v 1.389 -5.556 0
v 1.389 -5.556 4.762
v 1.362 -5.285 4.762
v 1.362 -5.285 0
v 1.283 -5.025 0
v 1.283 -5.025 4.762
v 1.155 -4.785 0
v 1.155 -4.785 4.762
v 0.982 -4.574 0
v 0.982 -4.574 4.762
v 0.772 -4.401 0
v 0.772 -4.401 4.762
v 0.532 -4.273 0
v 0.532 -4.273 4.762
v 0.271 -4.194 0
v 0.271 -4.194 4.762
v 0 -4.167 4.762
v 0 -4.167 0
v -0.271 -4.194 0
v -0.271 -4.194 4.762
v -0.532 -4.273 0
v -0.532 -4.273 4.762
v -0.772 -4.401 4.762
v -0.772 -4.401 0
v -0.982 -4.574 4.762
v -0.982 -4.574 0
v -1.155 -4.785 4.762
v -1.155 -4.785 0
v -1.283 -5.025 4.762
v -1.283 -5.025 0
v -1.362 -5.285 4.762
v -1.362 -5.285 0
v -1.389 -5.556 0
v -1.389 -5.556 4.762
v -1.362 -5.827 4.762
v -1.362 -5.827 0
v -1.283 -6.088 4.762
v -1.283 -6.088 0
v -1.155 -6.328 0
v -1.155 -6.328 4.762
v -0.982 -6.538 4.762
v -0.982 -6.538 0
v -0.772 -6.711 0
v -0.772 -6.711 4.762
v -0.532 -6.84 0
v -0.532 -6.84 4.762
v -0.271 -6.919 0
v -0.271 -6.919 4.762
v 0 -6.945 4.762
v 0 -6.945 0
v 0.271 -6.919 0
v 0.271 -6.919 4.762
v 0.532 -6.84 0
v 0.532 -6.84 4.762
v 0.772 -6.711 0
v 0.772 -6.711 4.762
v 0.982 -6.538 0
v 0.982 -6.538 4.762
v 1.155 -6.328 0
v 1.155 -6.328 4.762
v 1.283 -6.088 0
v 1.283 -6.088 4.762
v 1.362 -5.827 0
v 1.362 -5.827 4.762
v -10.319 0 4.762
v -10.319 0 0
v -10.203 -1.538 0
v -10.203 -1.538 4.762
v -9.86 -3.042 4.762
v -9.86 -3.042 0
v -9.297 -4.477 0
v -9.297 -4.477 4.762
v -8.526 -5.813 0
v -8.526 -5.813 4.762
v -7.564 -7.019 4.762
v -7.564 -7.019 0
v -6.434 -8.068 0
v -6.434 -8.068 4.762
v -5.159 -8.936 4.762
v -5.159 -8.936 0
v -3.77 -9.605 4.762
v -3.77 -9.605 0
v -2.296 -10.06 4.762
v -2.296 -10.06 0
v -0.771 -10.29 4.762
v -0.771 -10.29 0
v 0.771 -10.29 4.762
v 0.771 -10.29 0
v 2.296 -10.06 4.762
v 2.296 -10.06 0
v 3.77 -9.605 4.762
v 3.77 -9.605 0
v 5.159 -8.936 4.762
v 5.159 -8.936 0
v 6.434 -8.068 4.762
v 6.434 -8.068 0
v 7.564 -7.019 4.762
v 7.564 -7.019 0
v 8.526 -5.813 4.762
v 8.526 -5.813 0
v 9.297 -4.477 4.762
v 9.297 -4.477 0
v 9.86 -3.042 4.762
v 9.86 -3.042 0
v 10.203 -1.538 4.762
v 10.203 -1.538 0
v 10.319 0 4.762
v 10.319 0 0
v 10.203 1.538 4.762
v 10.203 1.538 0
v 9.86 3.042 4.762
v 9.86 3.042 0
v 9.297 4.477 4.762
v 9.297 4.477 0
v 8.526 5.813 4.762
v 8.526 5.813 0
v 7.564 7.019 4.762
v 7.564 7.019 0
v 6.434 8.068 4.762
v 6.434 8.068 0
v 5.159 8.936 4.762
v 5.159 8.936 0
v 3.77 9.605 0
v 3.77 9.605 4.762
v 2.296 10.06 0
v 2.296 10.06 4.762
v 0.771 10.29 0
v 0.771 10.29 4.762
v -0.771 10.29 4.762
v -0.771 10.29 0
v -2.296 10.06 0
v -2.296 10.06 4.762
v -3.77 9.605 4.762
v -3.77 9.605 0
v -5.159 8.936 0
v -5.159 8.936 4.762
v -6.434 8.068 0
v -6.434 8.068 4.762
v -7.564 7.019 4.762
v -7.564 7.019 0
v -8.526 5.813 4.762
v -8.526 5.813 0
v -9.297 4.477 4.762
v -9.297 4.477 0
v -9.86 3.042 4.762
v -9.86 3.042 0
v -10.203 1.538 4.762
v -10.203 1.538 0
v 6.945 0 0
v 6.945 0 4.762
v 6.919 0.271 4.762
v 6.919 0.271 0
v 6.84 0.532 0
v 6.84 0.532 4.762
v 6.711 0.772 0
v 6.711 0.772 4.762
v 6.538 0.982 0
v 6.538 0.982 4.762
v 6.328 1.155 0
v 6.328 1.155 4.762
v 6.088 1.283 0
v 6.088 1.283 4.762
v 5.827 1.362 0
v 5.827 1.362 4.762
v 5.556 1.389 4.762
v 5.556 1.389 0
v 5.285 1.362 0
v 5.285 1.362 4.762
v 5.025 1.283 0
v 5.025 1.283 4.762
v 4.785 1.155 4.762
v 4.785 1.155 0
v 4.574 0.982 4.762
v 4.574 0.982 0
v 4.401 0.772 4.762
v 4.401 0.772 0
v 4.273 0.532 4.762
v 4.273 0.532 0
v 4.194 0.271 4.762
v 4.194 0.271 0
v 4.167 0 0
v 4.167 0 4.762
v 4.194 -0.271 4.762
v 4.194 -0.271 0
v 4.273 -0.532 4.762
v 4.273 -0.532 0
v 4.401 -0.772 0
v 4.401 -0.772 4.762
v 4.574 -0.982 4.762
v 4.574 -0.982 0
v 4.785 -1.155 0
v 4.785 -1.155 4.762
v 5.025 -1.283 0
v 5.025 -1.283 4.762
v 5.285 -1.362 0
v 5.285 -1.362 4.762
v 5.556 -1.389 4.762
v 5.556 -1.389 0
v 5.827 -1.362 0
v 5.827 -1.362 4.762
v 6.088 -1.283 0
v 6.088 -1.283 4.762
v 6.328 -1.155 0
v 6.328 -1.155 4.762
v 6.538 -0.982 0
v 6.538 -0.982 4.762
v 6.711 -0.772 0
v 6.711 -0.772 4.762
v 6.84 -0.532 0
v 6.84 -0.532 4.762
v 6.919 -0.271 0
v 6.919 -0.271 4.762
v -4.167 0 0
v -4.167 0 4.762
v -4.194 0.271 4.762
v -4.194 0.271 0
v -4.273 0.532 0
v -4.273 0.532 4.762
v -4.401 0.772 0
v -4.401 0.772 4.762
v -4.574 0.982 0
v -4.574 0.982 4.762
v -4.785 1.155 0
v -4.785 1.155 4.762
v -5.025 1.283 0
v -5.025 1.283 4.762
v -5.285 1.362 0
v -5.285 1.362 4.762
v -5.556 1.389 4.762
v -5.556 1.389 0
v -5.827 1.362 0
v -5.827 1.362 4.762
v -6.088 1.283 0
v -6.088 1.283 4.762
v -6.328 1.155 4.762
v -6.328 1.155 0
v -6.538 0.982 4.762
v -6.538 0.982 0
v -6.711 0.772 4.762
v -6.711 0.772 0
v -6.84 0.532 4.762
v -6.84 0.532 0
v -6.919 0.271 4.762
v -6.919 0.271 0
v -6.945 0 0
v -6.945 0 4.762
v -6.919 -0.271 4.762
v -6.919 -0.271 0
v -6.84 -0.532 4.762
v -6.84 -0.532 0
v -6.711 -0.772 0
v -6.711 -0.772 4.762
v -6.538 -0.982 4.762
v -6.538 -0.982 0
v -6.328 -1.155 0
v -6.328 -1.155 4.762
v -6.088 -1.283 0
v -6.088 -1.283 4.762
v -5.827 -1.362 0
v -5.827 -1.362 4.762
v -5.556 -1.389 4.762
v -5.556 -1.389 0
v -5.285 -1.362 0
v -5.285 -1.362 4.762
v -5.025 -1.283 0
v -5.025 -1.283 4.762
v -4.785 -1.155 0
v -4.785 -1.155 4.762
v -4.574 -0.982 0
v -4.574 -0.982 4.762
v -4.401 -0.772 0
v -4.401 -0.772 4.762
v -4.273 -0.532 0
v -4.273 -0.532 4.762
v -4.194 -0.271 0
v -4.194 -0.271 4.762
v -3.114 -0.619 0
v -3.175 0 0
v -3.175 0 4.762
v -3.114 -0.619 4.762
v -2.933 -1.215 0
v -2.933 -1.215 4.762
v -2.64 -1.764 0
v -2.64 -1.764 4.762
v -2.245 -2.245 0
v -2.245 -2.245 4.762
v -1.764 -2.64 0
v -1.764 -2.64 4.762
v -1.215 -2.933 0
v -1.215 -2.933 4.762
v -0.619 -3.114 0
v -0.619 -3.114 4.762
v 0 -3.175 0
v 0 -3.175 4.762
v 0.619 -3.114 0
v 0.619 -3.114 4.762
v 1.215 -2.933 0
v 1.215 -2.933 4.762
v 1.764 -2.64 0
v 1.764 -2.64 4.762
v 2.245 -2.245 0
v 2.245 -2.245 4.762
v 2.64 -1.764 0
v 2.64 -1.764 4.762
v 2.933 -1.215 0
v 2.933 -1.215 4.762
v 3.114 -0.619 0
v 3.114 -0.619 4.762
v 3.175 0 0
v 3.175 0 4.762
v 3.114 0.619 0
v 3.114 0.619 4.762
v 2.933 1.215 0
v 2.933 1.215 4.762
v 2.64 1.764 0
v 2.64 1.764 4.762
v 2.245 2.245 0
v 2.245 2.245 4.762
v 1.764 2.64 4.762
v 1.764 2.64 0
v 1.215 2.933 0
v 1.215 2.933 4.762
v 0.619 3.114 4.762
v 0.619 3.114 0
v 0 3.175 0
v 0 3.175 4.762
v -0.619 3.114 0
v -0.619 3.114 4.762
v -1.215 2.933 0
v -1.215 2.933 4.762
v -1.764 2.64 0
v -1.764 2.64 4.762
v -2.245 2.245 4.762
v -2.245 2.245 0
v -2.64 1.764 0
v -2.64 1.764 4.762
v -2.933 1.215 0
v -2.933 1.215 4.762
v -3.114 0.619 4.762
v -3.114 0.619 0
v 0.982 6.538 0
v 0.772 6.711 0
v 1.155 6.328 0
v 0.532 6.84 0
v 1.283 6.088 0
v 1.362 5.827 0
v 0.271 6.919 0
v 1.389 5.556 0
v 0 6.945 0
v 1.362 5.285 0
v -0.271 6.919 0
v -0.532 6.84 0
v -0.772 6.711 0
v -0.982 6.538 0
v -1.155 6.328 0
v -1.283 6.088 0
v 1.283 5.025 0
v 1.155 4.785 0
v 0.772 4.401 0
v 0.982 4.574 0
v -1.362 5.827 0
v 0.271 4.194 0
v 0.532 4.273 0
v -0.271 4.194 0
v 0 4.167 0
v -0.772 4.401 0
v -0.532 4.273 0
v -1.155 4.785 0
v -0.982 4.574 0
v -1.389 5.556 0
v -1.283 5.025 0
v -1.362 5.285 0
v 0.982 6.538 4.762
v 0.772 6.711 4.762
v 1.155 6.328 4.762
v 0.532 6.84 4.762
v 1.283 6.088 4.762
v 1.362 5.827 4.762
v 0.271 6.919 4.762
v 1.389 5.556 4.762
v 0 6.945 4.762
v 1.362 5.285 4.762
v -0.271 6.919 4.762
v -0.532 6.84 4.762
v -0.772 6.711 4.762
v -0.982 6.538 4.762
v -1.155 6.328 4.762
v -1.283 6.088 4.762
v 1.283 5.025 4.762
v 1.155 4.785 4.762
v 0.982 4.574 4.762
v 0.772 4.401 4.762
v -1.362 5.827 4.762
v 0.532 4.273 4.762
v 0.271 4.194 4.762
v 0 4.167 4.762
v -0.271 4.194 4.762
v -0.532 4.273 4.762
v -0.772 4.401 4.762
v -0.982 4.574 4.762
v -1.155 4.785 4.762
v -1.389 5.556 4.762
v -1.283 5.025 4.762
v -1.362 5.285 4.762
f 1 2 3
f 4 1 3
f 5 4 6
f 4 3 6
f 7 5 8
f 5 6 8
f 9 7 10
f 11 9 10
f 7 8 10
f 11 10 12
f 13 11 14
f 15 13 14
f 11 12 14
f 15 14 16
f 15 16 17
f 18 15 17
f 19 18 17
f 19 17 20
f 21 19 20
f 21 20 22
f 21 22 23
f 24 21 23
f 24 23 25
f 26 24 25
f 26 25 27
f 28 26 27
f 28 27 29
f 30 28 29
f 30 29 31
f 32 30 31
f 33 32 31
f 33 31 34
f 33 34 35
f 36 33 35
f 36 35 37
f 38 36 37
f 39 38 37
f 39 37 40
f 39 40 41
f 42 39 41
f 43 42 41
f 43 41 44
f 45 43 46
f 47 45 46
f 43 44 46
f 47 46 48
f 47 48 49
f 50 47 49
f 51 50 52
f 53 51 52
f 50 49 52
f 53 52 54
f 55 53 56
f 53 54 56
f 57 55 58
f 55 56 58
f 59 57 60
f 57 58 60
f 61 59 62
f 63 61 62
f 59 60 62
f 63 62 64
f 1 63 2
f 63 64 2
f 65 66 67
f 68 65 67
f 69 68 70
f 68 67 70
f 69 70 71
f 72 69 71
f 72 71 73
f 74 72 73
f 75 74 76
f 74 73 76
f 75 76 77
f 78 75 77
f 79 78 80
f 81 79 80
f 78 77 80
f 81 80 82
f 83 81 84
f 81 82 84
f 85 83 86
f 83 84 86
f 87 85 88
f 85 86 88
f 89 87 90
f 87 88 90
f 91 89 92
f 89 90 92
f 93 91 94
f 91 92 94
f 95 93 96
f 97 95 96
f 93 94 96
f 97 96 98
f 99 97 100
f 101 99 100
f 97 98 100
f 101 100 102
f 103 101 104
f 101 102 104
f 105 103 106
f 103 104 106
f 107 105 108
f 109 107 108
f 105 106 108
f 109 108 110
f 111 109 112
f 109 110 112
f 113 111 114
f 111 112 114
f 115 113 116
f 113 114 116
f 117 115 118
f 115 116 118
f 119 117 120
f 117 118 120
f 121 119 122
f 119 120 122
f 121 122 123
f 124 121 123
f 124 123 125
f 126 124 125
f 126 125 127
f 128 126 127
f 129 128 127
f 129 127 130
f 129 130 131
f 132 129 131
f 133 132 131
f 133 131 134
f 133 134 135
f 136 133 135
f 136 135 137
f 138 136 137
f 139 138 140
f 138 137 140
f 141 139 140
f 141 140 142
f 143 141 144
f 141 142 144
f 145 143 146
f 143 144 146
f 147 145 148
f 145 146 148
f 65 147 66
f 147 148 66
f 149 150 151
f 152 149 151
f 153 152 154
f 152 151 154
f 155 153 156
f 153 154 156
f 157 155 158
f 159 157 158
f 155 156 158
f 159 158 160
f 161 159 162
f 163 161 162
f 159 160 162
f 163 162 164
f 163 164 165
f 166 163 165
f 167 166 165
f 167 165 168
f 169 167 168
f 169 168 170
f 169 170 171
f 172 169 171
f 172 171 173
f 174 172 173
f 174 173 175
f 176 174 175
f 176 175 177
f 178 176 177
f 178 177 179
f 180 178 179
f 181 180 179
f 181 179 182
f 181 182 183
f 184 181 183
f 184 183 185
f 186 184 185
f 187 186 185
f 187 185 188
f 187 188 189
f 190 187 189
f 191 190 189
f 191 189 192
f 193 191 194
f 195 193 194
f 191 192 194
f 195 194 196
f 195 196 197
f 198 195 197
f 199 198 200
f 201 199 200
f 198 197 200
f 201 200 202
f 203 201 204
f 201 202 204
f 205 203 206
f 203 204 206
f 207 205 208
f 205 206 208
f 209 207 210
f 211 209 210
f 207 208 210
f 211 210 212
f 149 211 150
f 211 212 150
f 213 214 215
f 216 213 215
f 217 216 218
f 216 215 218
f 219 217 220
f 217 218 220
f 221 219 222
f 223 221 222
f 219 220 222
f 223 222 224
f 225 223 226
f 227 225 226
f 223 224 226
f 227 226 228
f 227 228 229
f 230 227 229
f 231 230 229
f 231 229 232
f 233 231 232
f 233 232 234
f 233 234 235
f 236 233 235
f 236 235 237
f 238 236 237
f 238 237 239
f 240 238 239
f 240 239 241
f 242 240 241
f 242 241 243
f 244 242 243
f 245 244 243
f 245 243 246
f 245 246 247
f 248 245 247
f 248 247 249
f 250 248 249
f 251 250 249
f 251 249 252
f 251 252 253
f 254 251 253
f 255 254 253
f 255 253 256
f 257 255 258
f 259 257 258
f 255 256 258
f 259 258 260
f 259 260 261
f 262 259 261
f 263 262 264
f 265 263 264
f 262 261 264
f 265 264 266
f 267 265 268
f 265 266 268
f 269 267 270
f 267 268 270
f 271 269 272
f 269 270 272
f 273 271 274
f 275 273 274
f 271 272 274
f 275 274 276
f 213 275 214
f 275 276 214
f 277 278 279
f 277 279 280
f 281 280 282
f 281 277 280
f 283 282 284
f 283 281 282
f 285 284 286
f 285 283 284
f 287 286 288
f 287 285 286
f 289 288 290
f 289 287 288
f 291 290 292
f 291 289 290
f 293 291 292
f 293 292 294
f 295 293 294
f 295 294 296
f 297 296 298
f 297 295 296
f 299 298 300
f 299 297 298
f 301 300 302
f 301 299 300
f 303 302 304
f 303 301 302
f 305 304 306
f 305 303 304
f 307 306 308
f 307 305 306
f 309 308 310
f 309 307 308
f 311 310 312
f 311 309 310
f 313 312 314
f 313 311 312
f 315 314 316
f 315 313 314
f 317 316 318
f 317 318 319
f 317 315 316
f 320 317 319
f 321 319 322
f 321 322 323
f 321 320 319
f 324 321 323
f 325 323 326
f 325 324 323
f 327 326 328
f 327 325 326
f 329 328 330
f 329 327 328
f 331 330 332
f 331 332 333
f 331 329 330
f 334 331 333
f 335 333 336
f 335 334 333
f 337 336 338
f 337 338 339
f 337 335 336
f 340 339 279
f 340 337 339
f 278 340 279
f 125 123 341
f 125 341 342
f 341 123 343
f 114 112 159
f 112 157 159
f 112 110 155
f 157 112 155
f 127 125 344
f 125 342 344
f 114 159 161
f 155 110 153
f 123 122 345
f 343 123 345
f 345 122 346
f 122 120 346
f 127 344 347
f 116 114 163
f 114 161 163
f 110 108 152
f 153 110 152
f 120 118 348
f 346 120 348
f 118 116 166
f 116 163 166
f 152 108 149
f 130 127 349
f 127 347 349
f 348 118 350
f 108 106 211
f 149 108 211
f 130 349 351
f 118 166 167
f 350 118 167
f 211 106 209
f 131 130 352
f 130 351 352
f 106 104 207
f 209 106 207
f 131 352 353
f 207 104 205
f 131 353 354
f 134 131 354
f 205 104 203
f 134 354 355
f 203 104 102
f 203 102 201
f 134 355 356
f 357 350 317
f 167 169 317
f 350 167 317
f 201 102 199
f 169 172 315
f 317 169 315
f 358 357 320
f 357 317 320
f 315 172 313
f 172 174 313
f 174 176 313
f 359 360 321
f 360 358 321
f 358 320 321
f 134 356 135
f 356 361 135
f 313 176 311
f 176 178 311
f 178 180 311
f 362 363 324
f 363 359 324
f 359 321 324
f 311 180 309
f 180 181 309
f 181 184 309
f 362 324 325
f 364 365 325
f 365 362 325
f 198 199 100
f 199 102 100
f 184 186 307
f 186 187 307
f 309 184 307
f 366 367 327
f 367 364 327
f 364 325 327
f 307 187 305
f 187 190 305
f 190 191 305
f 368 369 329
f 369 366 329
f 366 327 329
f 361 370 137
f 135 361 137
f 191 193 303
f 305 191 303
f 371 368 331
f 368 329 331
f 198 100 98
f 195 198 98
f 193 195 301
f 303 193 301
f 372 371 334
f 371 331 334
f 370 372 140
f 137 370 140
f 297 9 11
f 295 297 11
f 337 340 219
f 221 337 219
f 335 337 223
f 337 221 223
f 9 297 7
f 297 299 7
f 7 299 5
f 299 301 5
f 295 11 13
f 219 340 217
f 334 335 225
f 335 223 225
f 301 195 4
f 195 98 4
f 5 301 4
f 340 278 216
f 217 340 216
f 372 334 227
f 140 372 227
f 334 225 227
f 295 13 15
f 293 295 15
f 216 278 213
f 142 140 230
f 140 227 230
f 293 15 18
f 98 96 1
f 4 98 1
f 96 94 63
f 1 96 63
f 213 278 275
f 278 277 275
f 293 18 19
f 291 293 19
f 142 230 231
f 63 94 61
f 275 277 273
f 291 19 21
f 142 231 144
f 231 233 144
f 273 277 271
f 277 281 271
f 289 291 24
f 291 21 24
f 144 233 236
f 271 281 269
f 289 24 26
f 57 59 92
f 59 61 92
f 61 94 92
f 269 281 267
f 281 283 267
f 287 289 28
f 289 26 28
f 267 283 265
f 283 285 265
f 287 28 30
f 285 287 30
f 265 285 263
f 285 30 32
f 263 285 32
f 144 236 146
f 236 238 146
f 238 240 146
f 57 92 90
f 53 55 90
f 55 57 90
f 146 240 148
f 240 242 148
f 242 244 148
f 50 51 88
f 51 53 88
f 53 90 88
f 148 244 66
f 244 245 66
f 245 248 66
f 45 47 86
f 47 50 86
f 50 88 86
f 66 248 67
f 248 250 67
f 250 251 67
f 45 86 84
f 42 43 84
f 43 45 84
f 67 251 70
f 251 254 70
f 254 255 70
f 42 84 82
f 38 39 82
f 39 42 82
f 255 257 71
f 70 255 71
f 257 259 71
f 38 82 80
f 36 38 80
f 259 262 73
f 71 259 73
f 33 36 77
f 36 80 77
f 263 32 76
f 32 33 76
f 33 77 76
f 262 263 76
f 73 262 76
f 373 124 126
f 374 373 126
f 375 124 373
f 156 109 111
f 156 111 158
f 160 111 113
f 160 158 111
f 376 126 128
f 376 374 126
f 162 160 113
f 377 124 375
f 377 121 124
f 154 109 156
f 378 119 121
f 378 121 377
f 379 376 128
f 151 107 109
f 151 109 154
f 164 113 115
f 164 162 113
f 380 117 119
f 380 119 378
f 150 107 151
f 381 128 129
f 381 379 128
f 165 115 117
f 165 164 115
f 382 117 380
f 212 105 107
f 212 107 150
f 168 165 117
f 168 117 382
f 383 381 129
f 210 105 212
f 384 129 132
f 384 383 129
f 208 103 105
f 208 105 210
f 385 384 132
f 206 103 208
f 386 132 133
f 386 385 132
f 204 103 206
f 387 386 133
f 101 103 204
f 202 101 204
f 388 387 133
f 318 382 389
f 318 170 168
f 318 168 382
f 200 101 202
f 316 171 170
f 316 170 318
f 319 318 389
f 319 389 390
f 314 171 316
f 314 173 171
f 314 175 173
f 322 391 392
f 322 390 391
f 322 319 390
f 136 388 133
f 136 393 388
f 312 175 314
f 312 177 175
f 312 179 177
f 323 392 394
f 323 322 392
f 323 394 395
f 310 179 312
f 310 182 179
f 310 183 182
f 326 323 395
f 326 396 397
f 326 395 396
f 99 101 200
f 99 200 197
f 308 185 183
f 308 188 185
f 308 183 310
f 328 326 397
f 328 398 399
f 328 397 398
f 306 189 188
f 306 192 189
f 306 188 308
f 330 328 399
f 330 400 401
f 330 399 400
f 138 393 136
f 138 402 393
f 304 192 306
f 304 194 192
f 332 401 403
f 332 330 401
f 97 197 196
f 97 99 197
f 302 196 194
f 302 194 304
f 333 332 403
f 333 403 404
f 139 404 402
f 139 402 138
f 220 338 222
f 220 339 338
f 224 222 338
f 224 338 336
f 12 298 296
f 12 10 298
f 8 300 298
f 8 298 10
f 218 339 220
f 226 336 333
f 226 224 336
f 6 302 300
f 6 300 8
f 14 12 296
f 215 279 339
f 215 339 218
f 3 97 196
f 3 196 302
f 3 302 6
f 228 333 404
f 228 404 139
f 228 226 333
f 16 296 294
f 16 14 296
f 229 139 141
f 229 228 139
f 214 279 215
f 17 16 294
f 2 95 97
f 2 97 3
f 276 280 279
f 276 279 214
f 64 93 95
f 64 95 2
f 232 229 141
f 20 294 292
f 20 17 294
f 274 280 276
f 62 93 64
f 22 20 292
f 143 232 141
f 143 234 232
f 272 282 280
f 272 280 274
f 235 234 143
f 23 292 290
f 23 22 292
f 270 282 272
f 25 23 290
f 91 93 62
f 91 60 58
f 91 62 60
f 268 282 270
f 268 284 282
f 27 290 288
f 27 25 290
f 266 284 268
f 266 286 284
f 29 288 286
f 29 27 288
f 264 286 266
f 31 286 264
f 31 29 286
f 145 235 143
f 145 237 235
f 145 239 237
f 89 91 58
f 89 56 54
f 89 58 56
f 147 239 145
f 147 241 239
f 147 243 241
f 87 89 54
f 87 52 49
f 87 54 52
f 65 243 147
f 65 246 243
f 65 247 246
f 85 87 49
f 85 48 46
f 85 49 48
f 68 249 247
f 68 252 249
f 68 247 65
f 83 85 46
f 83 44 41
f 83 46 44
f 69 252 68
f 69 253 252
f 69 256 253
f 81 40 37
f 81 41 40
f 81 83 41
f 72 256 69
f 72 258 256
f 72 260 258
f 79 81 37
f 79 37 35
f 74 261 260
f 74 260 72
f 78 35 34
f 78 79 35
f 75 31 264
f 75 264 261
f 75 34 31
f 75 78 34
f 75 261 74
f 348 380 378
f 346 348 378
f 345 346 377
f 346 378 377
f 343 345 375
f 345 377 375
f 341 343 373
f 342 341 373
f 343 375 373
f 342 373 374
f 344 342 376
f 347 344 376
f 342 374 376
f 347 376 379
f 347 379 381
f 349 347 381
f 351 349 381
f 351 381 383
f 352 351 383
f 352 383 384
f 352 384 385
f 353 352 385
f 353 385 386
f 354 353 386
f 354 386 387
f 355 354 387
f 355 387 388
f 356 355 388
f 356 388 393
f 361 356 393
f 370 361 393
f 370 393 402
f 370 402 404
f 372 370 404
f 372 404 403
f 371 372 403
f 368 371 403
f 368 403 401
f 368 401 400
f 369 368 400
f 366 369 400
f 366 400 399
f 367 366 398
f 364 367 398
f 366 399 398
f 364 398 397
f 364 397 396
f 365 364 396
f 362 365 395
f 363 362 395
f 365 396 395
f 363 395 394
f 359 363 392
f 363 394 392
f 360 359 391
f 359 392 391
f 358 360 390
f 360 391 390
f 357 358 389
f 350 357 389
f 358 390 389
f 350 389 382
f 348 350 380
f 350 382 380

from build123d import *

# Parameters (mm, degrees)
SKETCH1_R           = 10.31875
SKETCH1_R_2         = 3.175
BOSS_EXTRUDE1_DEPTH = 4.7625
SKETCH6_R           = 1.3890625
CUT_EXTRUDE1_DEPTH  = 16.350394437


with BuildPart() as part:
    # Sketch1 → Boss-Extrude1 (new body)
    with BuildSketch(Plane.XY):
        with Locations(Location((0, 0, 0), (0, 0, 180))):
            Circle(SKETCH1_R)
        with Locations(Location((0, 0, 0), (0, 0, 180))):
            Circle(SKETCH1_R_2, mode=Mode.SUBTRACT)
    extrude(amount=BOSS_EXTRUDE1_DEPTH)

    # Sketch6 → Cut-Extrude1 (cut, through all)
    with BuildSketch(Plane.XY.offset(4.7625)):
        with Locations((0, 5.55625)):
            Circle(SKETCH6_R)
        with Locations((5.55625, 0)):
            Circle(SKETCH6_R)
        with Locations((0, -5.55625)):
            Circle(SKETCH6_R)
        with Locations((-5.55625, 0)):
            Circle(SKETCH6_R)
    extrude(amount=-CUT_EXTRUDE1_DEPTH, mode=Mode.SUBTRACT)


solid = part.part
